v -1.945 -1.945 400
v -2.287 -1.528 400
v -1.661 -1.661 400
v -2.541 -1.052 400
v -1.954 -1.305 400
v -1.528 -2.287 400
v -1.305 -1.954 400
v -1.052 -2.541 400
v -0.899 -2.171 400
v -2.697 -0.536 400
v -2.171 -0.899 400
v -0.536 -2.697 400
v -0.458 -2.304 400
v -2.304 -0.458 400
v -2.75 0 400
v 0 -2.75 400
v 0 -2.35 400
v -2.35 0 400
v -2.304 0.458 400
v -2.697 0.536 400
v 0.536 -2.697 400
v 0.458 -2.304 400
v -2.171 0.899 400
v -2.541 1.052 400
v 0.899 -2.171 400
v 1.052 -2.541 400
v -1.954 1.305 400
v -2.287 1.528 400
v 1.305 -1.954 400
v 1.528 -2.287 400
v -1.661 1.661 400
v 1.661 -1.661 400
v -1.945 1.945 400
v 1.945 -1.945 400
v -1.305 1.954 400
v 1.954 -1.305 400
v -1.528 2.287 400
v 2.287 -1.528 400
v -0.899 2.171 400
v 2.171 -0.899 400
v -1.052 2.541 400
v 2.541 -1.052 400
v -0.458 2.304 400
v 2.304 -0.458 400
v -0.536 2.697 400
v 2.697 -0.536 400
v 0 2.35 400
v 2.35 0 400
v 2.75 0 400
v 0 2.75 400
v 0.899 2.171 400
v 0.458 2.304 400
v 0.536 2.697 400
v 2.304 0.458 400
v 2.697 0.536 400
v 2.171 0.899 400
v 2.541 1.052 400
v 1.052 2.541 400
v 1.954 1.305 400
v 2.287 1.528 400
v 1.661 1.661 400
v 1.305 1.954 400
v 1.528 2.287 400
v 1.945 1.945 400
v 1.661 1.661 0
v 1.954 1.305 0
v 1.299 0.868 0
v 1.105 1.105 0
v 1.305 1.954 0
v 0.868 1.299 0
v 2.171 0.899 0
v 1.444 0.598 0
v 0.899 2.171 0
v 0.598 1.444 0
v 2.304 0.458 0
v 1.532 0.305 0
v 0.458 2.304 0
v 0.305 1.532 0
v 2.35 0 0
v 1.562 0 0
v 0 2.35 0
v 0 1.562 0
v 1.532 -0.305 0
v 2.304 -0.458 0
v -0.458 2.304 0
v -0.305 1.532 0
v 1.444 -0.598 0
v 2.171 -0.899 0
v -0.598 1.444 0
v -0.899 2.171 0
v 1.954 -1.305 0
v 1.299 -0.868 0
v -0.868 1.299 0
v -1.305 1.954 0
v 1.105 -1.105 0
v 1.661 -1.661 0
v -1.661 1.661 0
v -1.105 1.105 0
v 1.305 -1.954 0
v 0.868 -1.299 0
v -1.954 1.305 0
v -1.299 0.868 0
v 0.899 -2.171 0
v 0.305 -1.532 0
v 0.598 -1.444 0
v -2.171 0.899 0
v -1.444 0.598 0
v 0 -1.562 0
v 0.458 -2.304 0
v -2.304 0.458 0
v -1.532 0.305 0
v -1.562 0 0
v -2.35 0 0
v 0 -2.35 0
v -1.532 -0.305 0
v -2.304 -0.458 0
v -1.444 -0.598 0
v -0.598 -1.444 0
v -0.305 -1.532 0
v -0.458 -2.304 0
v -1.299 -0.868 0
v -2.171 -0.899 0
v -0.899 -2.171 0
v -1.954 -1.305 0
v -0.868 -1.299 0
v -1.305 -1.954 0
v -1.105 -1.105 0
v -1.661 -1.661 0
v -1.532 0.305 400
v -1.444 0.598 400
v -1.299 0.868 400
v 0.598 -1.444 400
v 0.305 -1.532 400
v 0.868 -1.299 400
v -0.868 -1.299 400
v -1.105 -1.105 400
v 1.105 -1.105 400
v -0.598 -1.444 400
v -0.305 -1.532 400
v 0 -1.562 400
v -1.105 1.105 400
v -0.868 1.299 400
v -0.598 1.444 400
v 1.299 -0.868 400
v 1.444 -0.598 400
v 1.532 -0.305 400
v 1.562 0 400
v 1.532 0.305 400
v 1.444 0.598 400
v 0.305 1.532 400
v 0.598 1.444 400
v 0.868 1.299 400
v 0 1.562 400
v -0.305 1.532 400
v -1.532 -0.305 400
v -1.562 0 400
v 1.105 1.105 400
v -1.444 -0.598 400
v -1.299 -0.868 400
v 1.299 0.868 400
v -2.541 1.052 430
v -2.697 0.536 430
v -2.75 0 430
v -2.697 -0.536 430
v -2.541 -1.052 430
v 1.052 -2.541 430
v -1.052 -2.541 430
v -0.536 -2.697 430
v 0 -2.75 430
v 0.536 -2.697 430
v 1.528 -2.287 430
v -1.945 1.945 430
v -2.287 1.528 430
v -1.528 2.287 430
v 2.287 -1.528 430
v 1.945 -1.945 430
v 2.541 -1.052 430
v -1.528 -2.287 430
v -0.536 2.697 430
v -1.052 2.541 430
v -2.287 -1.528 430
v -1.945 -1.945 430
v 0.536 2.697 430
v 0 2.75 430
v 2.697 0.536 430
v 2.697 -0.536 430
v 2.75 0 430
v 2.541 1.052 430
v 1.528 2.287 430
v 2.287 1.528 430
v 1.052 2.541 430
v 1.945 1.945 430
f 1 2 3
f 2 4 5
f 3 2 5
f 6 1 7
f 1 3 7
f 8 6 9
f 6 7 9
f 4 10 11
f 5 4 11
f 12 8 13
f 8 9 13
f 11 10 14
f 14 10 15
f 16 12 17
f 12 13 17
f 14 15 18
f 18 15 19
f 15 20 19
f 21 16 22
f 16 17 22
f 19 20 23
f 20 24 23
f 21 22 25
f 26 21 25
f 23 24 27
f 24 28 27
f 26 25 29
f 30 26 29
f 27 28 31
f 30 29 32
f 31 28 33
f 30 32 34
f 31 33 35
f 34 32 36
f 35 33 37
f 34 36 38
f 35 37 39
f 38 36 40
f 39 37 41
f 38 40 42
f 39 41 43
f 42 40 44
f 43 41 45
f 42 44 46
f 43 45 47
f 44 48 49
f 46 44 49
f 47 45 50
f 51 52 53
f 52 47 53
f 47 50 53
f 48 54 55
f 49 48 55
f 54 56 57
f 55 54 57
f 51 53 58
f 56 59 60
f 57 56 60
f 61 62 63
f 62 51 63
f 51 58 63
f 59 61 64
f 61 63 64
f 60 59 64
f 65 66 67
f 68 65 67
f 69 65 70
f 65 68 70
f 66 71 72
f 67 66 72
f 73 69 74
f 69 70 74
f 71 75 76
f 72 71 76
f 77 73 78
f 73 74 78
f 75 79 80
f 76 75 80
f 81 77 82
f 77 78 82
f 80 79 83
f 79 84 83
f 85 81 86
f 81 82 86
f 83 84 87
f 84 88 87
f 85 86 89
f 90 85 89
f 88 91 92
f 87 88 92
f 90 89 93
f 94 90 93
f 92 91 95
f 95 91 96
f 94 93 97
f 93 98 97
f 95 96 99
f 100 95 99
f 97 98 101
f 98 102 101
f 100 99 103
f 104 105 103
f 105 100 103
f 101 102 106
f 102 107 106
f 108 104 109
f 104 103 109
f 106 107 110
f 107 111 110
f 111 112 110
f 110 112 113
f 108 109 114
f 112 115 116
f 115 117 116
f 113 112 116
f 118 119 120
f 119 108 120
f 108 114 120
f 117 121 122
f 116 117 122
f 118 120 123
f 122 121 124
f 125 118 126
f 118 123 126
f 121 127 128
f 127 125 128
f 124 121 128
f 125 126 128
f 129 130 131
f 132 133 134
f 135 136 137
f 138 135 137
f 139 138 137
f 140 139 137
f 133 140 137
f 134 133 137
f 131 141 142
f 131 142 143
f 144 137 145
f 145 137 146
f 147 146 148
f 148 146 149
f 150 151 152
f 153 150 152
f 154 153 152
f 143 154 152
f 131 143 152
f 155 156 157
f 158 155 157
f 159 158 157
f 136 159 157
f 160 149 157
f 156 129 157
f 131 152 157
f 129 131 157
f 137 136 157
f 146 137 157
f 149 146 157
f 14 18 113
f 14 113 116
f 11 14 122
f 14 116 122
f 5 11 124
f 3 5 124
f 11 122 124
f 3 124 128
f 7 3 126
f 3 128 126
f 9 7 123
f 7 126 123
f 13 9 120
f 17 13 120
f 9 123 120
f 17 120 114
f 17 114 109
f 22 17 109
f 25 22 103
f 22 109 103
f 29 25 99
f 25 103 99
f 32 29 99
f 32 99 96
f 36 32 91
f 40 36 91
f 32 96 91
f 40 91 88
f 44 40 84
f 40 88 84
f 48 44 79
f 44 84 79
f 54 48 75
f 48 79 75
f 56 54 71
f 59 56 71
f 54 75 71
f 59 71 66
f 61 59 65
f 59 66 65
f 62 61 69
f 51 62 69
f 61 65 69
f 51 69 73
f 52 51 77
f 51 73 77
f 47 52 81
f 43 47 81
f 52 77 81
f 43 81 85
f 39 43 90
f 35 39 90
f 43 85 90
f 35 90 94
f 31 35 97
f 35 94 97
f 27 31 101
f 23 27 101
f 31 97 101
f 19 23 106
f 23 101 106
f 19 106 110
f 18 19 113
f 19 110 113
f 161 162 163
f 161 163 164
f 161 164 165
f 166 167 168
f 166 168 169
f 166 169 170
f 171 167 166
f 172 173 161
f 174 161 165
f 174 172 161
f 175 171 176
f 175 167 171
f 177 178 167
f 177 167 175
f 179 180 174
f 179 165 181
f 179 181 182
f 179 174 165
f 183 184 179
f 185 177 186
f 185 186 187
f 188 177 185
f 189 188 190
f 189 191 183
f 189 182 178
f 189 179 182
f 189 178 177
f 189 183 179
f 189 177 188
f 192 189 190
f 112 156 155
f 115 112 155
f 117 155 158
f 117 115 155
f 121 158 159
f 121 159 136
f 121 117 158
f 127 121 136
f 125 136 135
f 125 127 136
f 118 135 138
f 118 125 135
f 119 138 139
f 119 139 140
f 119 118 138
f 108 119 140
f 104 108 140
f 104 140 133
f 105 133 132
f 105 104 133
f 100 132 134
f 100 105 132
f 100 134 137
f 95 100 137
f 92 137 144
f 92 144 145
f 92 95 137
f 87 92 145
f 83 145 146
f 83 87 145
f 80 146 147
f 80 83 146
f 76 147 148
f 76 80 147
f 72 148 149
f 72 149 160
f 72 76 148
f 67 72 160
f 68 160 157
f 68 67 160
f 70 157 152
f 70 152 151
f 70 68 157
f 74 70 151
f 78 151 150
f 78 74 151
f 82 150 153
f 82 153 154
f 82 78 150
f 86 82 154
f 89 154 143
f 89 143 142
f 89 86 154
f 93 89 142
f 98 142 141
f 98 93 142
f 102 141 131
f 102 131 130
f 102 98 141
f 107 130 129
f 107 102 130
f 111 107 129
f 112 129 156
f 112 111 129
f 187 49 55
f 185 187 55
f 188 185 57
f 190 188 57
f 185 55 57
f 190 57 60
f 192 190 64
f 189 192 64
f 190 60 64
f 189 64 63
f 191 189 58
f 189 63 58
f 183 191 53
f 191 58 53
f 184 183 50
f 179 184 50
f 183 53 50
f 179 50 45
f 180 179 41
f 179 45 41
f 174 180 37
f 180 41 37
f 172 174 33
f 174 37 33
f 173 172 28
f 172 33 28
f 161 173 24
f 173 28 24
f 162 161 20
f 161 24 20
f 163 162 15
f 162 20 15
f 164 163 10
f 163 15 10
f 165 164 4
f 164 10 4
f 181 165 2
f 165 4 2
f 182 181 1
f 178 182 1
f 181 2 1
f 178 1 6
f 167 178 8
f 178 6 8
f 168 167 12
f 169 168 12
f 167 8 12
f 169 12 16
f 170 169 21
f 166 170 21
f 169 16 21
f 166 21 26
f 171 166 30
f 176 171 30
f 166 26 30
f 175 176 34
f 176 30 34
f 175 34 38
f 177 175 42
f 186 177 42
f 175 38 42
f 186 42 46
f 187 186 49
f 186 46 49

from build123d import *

# Parameters (mm, degrees)
SKETCH1_R           = 2.3495
SKETCH1_R_2         = 1.5625
BOSS_EXTRUDE1_DEPTH = 400.0000001
SKETCH2_R           = 2.75
BOSS_EXTRUDE2_DEPTH = 30


with BuildPart() as part:
    # Sketch1 → Boss-Extrude1 (new body)
    with BuildSketch(Plane.XY):
        with Locations(Location((0, 0, 0), (0, 0, 180))):
            Circle(SKETCH1_R)
        with Locations(Location((0, 0, 0), (0, 0, 180))):
            Circle(SKETCH1_R_2, mode=Mode.SUBTRACT)
    extrude(amount=BOSS_EXTRUDE1_DEPTH)

    # Sketch2 → Boss-Extrude2 (add)
    with BuildSketch(Plane.XY.offset(400.0000001)):
        Circle(SKETCH2_R)
    extrude(amount=BOSS_EXTRUDE2_DEPTH)


solid = part.part
